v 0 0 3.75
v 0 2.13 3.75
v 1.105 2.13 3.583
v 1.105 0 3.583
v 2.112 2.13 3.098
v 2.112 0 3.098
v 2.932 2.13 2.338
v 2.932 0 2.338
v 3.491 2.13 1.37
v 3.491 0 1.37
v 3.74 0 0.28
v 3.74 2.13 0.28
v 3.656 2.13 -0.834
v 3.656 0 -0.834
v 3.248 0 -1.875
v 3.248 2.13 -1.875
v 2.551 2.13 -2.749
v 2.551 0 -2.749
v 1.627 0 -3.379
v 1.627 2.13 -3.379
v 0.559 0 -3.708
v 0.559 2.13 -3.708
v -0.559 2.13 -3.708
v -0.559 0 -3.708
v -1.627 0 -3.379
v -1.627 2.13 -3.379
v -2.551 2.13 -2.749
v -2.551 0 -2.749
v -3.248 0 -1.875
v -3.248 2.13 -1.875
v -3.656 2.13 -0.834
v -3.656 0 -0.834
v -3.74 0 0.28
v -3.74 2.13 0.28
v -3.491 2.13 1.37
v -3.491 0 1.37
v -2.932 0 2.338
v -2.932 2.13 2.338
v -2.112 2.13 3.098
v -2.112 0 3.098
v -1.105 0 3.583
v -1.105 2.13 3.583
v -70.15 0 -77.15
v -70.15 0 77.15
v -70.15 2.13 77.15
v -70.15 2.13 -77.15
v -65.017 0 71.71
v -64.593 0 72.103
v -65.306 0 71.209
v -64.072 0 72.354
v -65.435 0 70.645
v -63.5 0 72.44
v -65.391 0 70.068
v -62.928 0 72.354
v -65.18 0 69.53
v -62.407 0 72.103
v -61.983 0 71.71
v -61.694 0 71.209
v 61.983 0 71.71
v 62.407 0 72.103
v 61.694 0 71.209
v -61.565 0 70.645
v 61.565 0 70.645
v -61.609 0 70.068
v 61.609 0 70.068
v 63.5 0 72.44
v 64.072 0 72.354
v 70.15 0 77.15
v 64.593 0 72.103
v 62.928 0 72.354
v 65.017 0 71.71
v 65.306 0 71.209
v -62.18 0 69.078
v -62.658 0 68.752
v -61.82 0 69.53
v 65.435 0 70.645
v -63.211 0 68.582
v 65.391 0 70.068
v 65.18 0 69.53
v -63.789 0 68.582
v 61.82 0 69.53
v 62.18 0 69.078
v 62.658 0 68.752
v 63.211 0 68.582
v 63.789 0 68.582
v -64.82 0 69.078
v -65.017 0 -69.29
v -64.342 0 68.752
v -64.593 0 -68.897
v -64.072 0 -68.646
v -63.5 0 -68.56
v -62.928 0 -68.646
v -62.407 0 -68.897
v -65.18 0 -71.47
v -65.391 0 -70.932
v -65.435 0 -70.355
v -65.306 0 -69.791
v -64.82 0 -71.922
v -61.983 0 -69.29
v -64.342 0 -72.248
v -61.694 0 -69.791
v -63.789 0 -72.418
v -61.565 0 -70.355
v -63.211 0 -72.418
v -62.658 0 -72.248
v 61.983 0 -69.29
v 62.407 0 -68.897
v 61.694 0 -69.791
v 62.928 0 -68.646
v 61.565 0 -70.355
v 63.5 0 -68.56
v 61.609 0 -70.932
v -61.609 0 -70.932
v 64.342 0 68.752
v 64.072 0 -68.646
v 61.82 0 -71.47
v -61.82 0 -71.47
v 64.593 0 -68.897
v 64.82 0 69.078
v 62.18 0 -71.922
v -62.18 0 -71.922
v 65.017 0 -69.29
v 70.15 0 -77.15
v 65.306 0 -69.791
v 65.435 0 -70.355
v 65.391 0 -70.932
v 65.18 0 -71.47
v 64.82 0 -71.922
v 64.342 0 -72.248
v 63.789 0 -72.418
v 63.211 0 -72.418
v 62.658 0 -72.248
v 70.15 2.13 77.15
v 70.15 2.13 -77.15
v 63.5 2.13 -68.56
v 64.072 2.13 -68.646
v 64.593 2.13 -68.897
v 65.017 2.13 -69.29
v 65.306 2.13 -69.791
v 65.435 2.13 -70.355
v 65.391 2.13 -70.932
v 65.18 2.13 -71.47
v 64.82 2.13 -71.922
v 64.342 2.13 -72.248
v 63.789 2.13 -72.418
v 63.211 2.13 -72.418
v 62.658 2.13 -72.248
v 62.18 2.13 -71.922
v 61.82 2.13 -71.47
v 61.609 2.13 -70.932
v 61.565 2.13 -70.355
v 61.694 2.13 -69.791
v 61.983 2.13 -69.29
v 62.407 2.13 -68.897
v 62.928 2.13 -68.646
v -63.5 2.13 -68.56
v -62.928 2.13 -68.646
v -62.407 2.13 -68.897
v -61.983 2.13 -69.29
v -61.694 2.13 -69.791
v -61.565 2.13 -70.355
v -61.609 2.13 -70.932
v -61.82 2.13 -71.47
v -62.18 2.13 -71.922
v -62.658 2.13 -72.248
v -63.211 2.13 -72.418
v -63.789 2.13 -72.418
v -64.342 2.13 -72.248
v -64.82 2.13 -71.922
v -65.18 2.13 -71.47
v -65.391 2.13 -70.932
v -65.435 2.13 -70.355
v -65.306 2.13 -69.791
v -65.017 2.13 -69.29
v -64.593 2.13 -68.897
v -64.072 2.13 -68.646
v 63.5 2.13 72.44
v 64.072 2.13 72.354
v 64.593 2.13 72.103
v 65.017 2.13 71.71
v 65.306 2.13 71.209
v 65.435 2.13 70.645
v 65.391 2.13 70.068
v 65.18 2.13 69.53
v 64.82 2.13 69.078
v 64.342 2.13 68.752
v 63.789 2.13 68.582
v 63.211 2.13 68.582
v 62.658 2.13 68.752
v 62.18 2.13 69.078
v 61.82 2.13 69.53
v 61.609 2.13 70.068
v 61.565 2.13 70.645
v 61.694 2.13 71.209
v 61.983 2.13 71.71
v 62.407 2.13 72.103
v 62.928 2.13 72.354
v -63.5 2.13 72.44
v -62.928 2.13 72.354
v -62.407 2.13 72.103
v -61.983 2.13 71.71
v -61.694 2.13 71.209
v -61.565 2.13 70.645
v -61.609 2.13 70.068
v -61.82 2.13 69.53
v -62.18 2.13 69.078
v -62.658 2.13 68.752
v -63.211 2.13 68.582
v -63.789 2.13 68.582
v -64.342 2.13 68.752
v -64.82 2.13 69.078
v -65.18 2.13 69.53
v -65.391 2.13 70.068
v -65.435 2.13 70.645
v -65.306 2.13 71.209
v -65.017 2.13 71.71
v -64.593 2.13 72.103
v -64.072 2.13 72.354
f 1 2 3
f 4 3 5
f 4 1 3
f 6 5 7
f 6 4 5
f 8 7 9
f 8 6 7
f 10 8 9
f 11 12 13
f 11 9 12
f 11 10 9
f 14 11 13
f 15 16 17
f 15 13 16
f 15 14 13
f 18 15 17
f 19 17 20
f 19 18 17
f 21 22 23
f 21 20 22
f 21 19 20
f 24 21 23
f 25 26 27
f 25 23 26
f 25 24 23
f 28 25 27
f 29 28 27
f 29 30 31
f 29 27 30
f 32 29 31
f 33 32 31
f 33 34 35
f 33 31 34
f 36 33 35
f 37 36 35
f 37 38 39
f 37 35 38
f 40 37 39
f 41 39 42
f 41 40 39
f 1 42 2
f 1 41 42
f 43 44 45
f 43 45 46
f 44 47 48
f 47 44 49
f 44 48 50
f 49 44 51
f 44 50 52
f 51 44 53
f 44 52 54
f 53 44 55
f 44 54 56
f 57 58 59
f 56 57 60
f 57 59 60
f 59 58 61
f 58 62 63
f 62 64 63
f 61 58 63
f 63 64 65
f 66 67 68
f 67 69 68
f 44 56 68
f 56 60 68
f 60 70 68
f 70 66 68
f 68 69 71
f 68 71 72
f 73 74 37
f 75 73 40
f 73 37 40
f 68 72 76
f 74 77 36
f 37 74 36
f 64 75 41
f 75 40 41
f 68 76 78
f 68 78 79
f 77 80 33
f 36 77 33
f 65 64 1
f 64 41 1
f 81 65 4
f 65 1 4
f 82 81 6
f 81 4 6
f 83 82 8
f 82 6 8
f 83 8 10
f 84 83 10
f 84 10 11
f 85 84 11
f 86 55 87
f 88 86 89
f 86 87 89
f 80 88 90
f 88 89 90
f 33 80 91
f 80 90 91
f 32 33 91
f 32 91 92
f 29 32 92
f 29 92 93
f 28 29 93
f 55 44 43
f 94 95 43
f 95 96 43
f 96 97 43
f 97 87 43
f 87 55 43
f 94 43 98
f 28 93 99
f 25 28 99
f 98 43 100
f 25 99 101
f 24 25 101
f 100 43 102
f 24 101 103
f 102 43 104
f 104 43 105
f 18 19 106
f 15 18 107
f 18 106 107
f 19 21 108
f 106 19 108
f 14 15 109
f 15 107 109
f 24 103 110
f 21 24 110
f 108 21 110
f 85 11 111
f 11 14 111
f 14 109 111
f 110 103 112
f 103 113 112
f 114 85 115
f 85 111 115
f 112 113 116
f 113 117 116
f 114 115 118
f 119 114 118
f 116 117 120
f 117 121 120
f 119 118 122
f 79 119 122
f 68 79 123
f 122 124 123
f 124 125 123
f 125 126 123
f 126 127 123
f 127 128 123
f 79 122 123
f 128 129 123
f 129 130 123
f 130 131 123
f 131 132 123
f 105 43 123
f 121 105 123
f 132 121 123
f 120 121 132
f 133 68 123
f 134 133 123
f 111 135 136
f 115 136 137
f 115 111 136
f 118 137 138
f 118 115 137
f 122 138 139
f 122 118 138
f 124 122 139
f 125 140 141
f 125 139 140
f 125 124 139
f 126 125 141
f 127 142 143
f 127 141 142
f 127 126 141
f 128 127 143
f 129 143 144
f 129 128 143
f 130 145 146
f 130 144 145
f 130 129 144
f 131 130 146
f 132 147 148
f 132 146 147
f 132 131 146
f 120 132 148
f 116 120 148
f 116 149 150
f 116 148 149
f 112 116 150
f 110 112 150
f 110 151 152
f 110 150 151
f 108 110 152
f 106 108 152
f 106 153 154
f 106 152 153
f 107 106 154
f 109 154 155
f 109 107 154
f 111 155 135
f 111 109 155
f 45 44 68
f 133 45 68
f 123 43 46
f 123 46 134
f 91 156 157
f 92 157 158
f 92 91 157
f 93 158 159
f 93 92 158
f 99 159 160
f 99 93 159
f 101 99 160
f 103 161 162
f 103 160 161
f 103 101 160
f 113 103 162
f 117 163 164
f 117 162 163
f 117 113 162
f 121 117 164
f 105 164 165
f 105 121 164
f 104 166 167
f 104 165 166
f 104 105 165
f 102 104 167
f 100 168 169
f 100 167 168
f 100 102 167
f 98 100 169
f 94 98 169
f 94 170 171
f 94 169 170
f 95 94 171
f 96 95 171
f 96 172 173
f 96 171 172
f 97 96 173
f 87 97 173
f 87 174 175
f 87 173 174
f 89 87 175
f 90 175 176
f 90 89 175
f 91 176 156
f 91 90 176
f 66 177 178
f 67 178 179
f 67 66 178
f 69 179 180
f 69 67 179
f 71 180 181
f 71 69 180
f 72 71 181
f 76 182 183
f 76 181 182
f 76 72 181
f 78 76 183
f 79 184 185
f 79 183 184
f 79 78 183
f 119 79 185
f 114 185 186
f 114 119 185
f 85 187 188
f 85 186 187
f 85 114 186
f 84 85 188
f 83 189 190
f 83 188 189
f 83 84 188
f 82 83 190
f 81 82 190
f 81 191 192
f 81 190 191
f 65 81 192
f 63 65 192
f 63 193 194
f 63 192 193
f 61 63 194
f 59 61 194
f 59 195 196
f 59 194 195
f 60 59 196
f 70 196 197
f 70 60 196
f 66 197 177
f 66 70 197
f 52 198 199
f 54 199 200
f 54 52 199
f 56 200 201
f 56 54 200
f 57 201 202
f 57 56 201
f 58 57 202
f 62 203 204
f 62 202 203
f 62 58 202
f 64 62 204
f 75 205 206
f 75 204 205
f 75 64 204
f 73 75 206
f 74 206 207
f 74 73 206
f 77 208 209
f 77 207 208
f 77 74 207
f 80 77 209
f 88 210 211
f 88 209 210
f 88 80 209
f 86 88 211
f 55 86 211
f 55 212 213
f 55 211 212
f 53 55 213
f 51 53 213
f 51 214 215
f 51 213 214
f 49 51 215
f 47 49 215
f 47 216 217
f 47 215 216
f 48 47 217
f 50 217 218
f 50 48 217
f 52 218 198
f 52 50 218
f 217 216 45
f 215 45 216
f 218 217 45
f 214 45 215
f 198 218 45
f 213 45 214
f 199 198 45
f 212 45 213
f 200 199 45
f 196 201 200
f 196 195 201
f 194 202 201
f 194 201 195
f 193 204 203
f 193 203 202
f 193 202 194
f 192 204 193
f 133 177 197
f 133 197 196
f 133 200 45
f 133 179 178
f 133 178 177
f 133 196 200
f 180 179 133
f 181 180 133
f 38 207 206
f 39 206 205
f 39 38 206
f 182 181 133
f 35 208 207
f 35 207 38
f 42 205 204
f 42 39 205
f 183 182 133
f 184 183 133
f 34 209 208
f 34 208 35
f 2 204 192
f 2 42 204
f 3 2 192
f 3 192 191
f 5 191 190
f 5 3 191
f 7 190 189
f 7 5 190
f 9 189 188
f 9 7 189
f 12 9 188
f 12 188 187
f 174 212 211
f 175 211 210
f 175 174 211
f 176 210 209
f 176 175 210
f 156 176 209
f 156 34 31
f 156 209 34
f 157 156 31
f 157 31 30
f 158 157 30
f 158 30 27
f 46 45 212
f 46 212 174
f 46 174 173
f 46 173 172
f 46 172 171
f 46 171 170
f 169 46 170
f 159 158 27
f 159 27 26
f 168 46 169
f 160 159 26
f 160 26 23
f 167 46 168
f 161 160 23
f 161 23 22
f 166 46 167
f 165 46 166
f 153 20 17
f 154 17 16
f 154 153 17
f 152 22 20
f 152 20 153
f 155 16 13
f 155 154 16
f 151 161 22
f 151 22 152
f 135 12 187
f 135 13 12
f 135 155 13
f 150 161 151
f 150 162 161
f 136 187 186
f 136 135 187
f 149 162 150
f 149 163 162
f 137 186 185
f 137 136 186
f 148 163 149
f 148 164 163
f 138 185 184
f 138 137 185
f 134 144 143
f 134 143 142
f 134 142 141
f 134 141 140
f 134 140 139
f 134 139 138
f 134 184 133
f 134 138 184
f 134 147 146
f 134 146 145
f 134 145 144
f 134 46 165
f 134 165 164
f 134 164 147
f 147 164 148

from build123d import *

# Parameters (mm, degrees)
SKETCH1_W           = 140.3
SKETCH1_H           = 154.3
BOSS_EXTRUDE1_DEPTH = 2.13
SKETCH2_R           = 1.94
CUT_EXTRUDE1_DEPTH  = 31.13
SKETCH3_R           = 3.75
CUT_EXTRUDE2_DEPTH  = 20


with BuildPart() as part:
    # Sketch1 → Boss-Extrude1 (new body)
    with BuildSketch(Plane(origin=(0, 0, 0), x_dir=(1, 0, 0), z_dir=(0, 1, 0))):
        Rectangle(SKETCH1_W, SKETCH1_H)
    extrude(amount=BOSS_EXTRUDE1_DEPTH)

    # Sketch2 → Cut-Extrude1 (cut)
    with BuildSketch(Plane(origin=(0, 0, 0), x_dir=(1, 0, 0), z_dir=(0, 1, 0))):
        with Locations(Location((-63.5, -70.5, 0), (0, 0, 270))):
            Circle(SKETCH2_R)
        with Locations(Location((63.5, -70.5, 0), (0, 0, 270))):
            Circle(SKETCH2_R)
        with Locations(Location((-63.5, 70.5, 0), (0, 0, 270))):
            Circle(SKETCH2_R)
        with Locations(Location((63.5, 70.5, 0), (0, 0, 270))):
            Circle(SKETCH2_R)
    extrude(amount=CUT_EXTRUDE1_DEPTH, mode=Mode.SUBTRACT)

    # Sketch3 → Cut-Extrude2 (cut)
    with BuildSketch(Plane(origin=(0, 0, 0), x_dir=(1, 0, 0), z_dir=(0, 1, 0))):
        with Locations(Location((0, 0, 0), (0, 0, 270))):
            Circle(SKETCH3_R)
    extrude(amount=CUT_EXTRUDE2_DEPTH, mode=Mode.SUBTRACT)


solid = part.part
